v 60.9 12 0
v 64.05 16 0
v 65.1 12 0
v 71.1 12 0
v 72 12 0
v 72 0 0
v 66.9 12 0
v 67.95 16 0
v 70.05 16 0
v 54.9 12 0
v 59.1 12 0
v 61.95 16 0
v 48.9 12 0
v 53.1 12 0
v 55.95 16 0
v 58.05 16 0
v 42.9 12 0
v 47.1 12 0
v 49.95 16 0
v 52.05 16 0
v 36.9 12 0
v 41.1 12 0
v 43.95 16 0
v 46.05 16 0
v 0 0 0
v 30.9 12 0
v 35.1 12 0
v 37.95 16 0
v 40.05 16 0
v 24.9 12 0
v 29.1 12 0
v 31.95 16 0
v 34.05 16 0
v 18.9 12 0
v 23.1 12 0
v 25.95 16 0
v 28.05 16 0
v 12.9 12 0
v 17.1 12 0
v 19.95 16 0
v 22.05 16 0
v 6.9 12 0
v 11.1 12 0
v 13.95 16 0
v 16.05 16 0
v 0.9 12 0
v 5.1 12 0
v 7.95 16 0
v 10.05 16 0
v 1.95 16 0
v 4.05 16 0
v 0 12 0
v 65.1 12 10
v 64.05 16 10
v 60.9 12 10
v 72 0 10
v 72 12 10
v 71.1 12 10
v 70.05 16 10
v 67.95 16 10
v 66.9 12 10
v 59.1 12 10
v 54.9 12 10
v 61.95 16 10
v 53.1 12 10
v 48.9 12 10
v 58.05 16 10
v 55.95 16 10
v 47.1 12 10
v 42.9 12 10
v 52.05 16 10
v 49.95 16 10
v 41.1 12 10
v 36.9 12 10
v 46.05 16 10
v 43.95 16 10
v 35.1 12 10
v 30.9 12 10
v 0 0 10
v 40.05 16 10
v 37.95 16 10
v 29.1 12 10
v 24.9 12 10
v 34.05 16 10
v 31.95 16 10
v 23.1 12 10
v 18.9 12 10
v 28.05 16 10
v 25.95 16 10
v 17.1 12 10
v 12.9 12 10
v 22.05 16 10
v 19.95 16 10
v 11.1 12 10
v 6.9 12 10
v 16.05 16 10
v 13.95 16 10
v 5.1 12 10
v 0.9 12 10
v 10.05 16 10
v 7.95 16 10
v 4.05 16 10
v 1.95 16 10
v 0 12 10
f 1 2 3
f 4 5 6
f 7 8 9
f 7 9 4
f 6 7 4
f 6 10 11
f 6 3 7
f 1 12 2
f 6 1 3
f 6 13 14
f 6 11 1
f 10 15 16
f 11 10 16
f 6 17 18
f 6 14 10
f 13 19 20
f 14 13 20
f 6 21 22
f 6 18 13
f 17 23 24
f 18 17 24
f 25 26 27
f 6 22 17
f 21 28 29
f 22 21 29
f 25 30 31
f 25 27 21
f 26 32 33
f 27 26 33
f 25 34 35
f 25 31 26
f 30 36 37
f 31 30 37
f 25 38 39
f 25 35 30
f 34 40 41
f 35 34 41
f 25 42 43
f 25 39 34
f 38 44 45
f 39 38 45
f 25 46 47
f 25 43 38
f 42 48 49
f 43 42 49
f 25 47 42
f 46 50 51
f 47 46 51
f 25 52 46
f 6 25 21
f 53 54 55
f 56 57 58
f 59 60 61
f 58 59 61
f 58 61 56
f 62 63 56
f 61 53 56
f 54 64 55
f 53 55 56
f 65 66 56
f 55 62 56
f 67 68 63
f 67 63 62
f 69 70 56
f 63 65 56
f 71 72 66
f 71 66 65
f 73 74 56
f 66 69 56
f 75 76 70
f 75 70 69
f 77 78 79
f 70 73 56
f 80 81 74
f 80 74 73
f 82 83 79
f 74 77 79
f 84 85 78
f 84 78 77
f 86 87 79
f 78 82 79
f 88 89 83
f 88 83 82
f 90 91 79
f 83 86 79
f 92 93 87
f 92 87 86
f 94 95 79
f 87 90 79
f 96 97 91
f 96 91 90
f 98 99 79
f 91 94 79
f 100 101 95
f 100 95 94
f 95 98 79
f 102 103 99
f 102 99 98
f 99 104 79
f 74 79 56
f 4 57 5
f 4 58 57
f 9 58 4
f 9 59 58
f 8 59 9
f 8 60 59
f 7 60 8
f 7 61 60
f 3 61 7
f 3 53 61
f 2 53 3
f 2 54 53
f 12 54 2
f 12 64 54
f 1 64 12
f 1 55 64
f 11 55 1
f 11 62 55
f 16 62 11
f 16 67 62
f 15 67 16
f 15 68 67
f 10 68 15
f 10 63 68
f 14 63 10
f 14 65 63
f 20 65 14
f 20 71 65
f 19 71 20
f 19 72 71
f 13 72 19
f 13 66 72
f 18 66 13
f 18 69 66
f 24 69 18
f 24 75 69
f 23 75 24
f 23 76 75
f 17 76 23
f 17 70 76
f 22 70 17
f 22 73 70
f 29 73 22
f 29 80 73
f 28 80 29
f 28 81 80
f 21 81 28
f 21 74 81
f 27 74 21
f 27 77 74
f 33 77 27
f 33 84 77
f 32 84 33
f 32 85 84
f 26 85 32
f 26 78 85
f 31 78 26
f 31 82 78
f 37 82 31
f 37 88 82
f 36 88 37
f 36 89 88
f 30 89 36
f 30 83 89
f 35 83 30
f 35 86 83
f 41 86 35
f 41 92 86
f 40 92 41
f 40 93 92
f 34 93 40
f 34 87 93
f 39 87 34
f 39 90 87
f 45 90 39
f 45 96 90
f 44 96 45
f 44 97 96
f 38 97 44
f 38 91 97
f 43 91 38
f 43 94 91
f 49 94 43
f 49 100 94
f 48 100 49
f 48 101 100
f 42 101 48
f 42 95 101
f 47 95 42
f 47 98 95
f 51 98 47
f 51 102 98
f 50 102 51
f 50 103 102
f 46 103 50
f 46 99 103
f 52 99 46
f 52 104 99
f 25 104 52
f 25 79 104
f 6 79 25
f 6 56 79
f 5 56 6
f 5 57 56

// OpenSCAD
$fn = 32;

// ----------------------------------------------------------------------
// Gear rack: 12 teeth, pitch 6 mm
// ----------------------------------------------------------------------

// --- parameters (mm) ---
teeth = 12;               // number of teeth
pitch = 6;                // tooth pitch, X
root_w = 4.2;             // tooth width at the root
tip_w = 2.1;              // tooth width at the tip
base_h = 12;              // rack body height, Y
tooth_h = 4;              // tooth height above the body
plate_t = 10;             // rack width, Z (extrusion height)
fit_tol = 0.1;            // declared fit tolerance (prompt contract)
free_tol = 0.5;           // declared free tolerance (prompt contract)

rack_l = teeth * pitch;  // overall length
total_h = base_h + tooth_h;  // overall height

profile = [[0, 0], [72, 0], [72, 12], [71.1, 12], [70.05, 16], [67.95, 16], [66.9, 12], [65.1, 12], [64.05, 16], [61.95, 16], [60.9, 12], [59.1, 12], [58.05, 16], [55.95, 16], [54.9, 12], [53.1, 12], [52.05, 16], [49.95, 16], [48.9, 12], [47.1, 12], [46.05, 16], [43.95, 16], [42.9, 12], [41.1, 12], [40.05, 16], [37.95, 16], [36.9, 12], [35.1, 12], [34.05, 16], [31.95, 16], [30.9, 12], [29.1, 12], [28.05, 16], [25.95, 16], [24.9, 12], [23.1, 12], [22.05, 16], [19.95, 16], [18.9, 12], [17.1, 12], [16.05, 16], [13.95, 16], [12.9, 12], [11.1, 12], [10.05, 16], [7.95, 16], [6.9, 12], [5.1, 12], [4.05, 16], [1.95, 16], [0.9, 12], [0, 12]];  // primary outline, 52 points, counter clockwise

// --- the one profile operation ---
linear_extrude(height = plate_t) polygon(points = profile);
